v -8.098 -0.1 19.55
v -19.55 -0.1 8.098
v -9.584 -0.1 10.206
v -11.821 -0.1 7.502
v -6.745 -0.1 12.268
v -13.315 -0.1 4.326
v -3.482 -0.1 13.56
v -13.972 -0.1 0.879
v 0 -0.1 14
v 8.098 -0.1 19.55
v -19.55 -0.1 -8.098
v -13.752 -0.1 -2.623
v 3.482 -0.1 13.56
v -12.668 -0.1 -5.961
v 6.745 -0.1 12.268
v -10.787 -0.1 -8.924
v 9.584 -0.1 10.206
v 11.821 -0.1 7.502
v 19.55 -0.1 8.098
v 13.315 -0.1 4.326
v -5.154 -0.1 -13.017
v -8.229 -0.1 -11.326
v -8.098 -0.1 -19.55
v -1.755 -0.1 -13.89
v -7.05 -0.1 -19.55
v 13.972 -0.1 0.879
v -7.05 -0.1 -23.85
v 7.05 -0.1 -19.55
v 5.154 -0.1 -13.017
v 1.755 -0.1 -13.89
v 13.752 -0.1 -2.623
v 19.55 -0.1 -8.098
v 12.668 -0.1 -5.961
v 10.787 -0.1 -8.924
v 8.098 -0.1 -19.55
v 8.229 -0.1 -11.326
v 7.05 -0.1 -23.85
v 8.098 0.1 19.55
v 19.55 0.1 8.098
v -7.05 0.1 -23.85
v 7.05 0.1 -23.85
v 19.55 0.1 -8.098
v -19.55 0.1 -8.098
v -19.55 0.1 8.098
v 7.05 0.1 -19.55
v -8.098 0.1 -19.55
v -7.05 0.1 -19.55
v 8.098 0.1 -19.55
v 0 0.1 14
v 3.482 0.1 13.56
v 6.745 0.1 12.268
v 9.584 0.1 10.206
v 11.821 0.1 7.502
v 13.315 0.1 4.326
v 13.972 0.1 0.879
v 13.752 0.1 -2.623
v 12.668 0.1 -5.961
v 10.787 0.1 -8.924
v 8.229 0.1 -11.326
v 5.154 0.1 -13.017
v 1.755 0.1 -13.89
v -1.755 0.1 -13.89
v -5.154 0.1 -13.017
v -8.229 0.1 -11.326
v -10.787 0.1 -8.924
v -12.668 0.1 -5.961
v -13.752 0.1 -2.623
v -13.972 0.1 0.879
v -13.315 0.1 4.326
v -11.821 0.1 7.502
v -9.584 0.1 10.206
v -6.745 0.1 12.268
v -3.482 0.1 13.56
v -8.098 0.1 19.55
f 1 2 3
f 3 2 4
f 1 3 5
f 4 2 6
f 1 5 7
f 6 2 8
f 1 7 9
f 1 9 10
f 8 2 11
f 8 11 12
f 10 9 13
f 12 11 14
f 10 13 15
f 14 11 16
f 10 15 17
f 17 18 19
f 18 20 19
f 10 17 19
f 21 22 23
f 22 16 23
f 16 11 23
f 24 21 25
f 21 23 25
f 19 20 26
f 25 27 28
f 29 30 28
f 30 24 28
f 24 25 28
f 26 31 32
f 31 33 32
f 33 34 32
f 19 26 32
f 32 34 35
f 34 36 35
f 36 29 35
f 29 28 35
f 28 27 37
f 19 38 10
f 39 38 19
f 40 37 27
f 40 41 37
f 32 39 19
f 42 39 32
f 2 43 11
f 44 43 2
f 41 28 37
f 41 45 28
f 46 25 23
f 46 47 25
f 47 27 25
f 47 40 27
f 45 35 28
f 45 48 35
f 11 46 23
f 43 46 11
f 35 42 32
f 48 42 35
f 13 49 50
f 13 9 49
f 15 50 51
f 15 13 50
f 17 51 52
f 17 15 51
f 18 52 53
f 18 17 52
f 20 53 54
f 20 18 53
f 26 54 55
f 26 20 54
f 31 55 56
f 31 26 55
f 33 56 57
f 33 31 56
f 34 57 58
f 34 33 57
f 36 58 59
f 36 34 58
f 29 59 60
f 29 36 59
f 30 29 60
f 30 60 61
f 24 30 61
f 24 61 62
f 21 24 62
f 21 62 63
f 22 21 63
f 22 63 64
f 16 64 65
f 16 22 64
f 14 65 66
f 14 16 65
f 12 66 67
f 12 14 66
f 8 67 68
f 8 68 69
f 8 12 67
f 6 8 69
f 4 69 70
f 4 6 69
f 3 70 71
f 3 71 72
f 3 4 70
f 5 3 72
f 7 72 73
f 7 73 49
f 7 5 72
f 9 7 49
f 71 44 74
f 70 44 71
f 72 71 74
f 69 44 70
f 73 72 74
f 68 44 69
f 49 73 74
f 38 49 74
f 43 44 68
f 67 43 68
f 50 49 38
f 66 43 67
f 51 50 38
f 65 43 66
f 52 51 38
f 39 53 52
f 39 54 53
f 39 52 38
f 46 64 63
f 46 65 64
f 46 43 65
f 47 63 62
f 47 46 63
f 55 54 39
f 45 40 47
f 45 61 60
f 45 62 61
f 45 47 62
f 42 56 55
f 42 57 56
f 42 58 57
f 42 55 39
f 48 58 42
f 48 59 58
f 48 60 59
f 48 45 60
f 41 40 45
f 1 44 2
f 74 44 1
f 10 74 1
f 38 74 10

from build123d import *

# Parameters (mm, degrees)
ESBO_O1_R                = 14
RESSALTO_EXTRUS_O1_DEPTH = 0.1


with BuildPart() as part:
    # Esboço1 → Ressalto-extrusão1 (new, symmetric)
    with BuildSketch(Plane(origin=(0, 0, 0), x_dir=(1, 0, 0), z_dir=(0, 1, 0))):
        Polygon((-7.05, 19.55), (-8.097875144, 19.55), (-19.55, 8.097875144), (-19.55, -8.097875144), (-8.097875144, -19.55), (8.097875144, -19.55), (19.55, -8.097875144), (19.55, 8.097875144), (8.097875144, 19.55), (7.05, 19.55), (7.05, 23.85), (-7.05, 23.85), align=None)
        with Locations(Location((0, 0, 0), (0, 0, 270))):
            Circle(ESBO_O1_R, mode=Mode.SUBTRACT)
    extrude(amount=RESSALTO_EXTRUS_O1_DEPTH, both=True)


solid = part.part
